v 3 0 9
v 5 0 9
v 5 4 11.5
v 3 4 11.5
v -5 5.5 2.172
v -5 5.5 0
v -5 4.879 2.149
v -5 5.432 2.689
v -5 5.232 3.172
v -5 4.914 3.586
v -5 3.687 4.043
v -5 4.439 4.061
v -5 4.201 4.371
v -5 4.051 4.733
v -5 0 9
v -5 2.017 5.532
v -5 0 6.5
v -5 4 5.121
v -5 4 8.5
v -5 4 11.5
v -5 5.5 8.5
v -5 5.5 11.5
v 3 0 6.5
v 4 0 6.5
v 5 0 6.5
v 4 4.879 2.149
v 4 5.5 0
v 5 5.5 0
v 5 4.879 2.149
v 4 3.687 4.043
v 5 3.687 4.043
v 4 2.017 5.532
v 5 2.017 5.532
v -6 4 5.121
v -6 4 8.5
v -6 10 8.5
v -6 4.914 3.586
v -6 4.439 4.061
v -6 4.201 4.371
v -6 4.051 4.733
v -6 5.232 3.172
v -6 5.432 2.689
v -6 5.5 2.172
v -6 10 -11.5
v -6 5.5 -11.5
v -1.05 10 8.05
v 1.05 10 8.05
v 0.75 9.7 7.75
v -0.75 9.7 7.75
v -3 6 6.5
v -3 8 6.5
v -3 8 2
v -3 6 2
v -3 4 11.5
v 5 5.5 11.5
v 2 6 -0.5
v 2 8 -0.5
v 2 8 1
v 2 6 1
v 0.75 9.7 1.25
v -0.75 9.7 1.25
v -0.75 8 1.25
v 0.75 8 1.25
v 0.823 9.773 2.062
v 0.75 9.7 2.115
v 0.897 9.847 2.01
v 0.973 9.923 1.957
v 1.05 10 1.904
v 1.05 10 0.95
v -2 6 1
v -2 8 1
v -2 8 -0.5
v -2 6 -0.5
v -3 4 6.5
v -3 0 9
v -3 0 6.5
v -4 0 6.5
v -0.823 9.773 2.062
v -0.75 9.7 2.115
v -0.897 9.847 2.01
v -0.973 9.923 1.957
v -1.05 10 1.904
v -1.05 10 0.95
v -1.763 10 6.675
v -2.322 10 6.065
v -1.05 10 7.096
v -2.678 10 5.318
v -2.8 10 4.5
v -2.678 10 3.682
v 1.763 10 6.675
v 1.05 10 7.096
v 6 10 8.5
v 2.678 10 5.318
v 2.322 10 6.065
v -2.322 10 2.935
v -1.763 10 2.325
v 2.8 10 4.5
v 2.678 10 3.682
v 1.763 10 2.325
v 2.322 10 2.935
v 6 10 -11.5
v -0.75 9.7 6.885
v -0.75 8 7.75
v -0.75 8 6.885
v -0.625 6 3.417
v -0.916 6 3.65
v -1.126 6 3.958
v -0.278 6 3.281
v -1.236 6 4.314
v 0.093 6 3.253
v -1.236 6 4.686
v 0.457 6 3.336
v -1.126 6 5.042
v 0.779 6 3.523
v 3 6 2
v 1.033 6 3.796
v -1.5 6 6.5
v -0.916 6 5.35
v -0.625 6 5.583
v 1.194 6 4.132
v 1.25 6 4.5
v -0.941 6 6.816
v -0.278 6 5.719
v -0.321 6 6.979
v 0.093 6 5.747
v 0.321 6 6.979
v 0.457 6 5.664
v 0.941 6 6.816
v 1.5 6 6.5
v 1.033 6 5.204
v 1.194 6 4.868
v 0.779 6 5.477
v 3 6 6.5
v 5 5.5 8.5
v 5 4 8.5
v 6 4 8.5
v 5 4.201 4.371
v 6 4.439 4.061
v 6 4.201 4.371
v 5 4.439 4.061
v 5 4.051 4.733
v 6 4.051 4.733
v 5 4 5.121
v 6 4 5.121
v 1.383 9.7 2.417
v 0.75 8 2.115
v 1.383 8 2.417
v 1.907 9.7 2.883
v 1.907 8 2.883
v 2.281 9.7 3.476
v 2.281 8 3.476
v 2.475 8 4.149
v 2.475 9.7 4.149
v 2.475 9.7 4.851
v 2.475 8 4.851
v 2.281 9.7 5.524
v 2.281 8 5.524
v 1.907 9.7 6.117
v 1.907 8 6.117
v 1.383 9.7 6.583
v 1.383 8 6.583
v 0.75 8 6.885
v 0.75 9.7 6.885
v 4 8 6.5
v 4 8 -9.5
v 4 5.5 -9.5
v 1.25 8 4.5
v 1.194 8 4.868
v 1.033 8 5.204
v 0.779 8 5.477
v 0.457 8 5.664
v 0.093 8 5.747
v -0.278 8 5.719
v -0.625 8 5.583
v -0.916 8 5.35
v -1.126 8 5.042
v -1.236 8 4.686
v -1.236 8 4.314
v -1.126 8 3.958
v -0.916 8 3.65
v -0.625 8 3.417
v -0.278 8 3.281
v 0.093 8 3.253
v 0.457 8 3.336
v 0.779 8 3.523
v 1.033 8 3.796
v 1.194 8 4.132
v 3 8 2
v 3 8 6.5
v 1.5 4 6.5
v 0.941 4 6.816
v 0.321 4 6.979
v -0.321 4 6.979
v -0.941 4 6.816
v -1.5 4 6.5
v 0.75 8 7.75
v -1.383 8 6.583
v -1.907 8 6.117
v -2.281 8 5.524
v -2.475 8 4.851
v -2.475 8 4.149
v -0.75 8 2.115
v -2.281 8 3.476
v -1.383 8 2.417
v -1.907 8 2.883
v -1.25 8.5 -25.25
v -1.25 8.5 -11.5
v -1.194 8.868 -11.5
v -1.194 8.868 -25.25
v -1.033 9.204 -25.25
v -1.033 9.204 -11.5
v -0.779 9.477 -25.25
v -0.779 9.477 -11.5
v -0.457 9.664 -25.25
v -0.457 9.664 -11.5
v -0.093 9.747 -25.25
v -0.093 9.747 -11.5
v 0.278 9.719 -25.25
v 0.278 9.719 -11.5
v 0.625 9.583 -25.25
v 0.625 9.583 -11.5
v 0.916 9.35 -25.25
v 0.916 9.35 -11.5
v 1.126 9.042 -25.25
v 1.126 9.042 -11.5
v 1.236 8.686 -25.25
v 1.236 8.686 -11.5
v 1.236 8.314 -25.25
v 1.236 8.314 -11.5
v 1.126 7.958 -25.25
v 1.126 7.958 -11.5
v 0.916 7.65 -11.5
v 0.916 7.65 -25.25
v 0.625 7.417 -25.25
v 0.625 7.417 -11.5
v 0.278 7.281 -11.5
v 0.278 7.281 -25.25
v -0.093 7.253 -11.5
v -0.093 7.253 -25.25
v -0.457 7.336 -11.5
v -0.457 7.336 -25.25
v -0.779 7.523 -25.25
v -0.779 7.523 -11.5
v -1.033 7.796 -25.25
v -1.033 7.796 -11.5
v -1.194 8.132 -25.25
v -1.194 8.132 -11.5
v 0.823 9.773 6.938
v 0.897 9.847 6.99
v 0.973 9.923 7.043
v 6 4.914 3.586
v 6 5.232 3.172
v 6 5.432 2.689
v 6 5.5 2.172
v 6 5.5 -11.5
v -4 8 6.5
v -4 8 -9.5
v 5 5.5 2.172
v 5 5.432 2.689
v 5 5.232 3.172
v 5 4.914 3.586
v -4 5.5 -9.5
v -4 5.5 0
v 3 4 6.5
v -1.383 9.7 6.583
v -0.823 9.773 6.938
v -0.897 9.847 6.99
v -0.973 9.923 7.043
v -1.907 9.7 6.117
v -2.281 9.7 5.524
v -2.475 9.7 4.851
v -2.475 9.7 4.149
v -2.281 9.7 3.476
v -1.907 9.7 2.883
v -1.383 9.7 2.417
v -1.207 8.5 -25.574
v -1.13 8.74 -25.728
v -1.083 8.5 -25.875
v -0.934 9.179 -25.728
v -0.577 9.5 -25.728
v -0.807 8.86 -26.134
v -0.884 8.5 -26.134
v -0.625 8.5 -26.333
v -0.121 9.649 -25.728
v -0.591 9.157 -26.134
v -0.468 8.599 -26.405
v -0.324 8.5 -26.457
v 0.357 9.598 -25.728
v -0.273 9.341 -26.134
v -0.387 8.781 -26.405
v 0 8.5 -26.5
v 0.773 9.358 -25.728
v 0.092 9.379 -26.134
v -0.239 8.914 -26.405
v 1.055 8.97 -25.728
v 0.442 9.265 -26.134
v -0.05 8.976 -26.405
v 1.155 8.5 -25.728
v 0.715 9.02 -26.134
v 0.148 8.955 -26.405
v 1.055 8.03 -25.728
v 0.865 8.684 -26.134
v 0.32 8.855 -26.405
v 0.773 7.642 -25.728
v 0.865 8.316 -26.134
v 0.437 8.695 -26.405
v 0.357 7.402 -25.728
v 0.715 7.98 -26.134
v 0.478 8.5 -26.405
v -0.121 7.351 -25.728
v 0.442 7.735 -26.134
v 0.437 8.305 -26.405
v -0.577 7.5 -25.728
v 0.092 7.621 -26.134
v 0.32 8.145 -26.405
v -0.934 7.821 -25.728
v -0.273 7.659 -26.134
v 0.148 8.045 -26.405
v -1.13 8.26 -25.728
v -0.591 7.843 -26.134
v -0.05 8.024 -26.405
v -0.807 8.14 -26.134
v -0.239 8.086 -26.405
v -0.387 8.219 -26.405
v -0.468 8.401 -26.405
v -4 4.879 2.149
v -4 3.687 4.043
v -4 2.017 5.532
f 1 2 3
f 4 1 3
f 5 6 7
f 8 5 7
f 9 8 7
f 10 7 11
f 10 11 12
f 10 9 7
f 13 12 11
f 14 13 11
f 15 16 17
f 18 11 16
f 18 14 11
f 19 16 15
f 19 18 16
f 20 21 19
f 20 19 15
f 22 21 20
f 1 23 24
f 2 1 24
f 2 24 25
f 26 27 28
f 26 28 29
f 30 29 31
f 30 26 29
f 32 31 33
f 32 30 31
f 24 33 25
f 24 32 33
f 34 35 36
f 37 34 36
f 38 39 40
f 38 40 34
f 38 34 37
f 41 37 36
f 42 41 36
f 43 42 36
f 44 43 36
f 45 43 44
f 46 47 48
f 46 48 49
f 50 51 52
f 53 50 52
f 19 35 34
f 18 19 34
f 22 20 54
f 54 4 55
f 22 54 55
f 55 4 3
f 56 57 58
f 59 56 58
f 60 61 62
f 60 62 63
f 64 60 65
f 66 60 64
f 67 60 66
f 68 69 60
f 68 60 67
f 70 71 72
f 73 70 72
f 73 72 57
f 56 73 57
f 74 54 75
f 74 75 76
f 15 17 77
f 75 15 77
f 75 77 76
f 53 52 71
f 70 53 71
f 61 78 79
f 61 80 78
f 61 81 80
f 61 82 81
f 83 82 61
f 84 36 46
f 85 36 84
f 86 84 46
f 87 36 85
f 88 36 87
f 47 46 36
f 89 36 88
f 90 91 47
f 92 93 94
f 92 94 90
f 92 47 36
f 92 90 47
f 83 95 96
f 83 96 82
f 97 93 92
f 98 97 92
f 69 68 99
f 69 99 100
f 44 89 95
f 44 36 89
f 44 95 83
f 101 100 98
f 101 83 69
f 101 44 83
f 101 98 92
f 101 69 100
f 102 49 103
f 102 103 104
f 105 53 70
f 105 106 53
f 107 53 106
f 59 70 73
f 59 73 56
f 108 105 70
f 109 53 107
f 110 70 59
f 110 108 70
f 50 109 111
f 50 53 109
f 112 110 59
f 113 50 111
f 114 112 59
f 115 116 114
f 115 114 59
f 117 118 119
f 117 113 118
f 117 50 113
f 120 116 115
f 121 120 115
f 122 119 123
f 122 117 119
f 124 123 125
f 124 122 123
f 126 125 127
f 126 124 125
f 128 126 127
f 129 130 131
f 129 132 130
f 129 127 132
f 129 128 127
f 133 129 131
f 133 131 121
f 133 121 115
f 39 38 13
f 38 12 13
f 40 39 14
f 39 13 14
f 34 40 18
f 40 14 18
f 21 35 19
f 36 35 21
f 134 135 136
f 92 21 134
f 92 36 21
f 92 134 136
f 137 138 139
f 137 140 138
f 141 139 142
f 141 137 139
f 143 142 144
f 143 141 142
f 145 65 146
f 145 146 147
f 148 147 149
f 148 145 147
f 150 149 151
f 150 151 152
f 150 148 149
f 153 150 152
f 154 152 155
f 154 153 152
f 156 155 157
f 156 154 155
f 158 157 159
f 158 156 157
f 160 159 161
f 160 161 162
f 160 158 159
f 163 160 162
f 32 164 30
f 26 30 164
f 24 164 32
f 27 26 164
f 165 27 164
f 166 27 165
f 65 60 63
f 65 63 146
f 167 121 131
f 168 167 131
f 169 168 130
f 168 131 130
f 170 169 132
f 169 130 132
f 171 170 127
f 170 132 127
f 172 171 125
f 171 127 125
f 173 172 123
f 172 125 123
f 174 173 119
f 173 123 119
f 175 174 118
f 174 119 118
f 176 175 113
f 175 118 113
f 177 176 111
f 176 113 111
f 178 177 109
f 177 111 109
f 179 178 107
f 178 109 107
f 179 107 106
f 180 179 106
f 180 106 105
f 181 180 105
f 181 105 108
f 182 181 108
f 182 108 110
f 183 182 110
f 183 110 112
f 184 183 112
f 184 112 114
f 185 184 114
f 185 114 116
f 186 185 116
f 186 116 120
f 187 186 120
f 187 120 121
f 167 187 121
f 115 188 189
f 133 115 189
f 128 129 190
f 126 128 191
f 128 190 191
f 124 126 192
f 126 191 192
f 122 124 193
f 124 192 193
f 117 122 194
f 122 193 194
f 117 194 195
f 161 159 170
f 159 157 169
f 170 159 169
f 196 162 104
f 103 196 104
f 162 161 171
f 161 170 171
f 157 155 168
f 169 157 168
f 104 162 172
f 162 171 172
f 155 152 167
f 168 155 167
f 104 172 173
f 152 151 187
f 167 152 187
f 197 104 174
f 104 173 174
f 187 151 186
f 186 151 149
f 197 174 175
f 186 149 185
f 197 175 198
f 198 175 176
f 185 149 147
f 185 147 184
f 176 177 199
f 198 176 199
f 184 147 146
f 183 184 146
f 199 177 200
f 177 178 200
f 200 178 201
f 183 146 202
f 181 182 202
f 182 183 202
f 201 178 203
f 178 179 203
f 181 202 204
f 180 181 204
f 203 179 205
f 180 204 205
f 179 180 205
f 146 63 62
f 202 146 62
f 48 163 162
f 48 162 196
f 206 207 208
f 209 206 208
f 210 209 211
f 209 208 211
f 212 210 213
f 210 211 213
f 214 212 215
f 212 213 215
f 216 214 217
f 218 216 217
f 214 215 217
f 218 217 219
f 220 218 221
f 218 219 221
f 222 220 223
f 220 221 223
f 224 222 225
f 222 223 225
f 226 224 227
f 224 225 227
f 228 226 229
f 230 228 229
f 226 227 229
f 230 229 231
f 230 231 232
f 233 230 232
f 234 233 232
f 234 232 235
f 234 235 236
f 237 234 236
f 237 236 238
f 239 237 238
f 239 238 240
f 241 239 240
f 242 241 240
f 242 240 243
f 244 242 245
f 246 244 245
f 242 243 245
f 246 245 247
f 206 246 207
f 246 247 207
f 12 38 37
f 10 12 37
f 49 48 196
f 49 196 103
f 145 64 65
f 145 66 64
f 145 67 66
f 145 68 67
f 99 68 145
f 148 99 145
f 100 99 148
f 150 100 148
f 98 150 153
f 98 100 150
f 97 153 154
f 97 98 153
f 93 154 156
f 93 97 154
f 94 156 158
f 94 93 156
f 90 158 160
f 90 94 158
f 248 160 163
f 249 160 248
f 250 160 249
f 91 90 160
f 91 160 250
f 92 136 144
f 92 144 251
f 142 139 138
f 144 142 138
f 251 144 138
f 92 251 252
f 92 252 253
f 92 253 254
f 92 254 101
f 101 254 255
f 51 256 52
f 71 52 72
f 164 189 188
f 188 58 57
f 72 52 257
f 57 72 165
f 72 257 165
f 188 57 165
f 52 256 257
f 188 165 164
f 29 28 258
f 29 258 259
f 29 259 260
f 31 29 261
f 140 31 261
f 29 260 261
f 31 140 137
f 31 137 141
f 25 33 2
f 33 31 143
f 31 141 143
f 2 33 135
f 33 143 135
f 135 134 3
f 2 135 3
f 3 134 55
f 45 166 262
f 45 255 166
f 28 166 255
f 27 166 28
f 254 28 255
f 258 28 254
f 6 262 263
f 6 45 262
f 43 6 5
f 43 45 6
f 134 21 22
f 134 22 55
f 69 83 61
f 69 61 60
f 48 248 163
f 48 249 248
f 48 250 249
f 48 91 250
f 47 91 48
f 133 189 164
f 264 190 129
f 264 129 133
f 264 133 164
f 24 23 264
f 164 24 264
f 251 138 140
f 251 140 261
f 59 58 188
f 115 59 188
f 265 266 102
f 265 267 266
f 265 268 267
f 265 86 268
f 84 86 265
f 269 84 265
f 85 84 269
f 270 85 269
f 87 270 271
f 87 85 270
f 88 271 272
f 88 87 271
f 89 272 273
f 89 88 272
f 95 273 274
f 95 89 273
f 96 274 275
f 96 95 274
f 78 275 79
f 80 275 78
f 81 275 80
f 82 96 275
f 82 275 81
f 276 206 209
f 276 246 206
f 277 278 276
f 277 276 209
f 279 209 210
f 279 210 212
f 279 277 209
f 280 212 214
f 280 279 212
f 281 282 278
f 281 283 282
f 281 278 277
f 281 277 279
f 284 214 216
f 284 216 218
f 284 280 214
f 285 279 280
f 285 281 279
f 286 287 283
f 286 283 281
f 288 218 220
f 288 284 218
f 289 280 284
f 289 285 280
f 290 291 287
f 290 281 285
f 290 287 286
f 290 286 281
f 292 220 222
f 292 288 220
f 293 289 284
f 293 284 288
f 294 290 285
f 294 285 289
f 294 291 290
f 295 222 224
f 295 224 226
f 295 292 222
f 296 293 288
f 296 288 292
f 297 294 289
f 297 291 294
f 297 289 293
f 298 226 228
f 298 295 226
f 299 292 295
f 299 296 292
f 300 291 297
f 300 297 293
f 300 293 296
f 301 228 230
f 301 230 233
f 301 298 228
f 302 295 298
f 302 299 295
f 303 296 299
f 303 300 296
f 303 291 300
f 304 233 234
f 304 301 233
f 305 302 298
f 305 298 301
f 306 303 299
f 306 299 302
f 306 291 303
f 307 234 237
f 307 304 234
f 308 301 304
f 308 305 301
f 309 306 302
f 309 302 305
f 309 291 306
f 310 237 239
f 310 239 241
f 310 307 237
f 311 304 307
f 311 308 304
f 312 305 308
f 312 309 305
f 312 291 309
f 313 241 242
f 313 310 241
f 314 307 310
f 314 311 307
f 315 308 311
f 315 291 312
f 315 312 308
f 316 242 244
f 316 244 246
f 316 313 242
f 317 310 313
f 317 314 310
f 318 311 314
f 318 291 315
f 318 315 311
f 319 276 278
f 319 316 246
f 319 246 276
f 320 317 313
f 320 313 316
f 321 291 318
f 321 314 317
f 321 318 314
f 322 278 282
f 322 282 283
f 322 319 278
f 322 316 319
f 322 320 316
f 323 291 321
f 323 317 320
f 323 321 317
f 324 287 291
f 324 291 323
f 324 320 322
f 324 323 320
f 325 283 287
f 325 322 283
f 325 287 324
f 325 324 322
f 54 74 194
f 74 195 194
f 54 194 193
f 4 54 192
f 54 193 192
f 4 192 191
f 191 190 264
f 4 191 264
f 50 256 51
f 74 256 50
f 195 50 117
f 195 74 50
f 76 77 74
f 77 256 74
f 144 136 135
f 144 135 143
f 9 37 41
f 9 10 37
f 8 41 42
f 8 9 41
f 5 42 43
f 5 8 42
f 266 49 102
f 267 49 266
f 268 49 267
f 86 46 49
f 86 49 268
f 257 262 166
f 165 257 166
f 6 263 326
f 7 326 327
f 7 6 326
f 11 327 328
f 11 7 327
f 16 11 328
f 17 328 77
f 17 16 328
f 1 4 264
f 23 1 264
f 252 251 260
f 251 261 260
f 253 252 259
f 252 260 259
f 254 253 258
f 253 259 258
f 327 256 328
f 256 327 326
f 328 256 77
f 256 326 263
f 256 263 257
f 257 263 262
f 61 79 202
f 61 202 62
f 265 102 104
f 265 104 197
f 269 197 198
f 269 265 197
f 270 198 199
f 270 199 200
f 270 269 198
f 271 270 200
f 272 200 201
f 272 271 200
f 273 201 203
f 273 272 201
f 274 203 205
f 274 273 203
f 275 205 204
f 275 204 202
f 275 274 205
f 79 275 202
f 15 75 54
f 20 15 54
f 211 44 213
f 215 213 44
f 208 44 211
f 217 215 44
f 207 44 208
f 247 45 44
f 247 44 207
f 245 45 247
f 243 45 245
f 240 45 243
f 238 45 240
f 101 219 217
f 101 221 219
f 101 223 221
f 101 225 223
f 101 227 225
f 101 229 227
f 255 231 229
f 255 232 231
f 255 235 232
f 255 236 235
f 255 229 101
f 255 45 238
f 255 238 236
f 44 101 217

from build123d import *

# Parameters (mm, degrees)
SKETCH_1_W             = 12
SKETCH_1_H             = 23
EXTRUDE_1_DEPTH        = 10
SKETCH_3_W             = 12
SKETCH_3_H             = 3
CUT_EXTRUDE_1_DEPTH    = 4.5
SKETCH_4_W             = 1
SKETCH_4_H             = 3
CUT_EXTRUDE_2_DEPTH    = 11
CUT_EXTRUDE_3_DEPTH    = 6
CUT_EXTRUDE_4_DEPTH    = 1
FILLET_1_R             = 1.5
FILLET_2_R             = 2
FILLET_1_OF_MIRROR_1_R = 1.5
FILLET_2_OF_MIRROR_1_R = 2
SKETCH_7_W             = 6
SKETCH_7_H             = 11.5
CUT_EXTRUDE_5_DEPTH    = 4
SKETCH_8_W             = 8
SKETCH_8_H             = 16
CUT_EXTRUDE_6_DEPTH    = 8
SKETCH_9_R             = 2.5
CUT_EXTRUDE_7_DEPTH    = 4
EXTRUDE_2_DEPTH        = 2
SKETCH_11_R            = 1.25
CUT_EXTRUDE_8_DEPTH    = 5
CUT_EXTRUDE_9_DEPTH    = 2
CHAMFER_1_SIZE         = 0.3
SKETCH_13_R            = 1.25
EXTRUDE_3_DEPTH        = 15
FILLET_3_R             = 1.25


with BuildPart() as part:
    # 草图1 → 凸台-拉伸1 (new body)
    with BuildSketch(Plane(origin=(0, 0, 0), x_dir=(1, 0, 0), z_dir=(0, 1, 0))):
        Rectangle(SKETCH_1_W, SKETCH_1_H)
    extrude(amount=EXTRUDE_1_DEPTH)

    # 草图3 → 切除-拉伸1 (cut)
    with BuildSketch(Plane(origin=(0, 10, 0), x_dir=(1, 0, 0), z_dir=(0, 1, 0))):
        with Locations((0, -10)):
            Rectangle(SKETCH_3_W, SKETCH_3_H)
    extrude(amount=-CUT_EXTRUDE_1_DEPTH, mode=Mode.SUBTRACT)

    # 草图4 → 切除-拉伸2 (cut, through all)
    with BuildSketch(Plane(origin=(0, 0, 0), x_dir=(1, 0, 0), z_dir=(0, 1, 0))):
        with Locations((5.5, -10)):
            Rectangle(SKETCH_4_W, SKETCH_4_H)
        with Locations((-5.5, -10)):
            Rectangle(SKETCH_4_W, SKETCH_4_H)
    extrude(amount=CUT_EXTRUDE_2_DEPTH, mode=Mode.SUBTRACT)

    # 草图5 → 切除-拉伸3 (cut, symmetric)
    with BuildSketch(Plane(origin=(0, 0, 0), x_dir=(0, 0, -1), z_dir=(1, 0, 0))):
        with BuildLine():
            Line((11.5, 5.5), (0, 5.5))
            ThreePointArc((0, 5.5), (-4.042500986, 3.686592074), (-6.5, 0))
            Line((-6.5, 0), (11.5, 0))
            Line((11.5, 0), (11.5, 5.5))
        make_face()
        Polygon((-9, 0), (-11.5, 4), (-11.5, 0), align=None)
    extrude(amount=CUT_EXTRUDE_3_DEPTH, both=True, mode=Mode.SUBTRACT)

    # 草图6 → 切除-拉伸4 (cut)
    with BuildSketch(Plane(origin=(6, 0, 0), x_dir=(0, 0, -1), z_dir=(1, 0, 0))):
        with BuildLine():
            Line((-8.5, 4), (-4.5, 4))
            Line((-4.5, 4), (-3, 5.5))
            Line((-3, 5.5), (0, 5.5))
            ThreePointArc((0, 5.5), (-4.042500986, 3.686592074), (-6.5, 0))
            Line((-6.5, 0), (-8.5, 0))
            Line((-8.5, 0), (-8.5, 4))
        make_face()
    cut_extrude_4 = extrude(amount=-CUT_EXTRUDE_4_DEPTH, mode=Mode.SUBTRACT)

    # 圆角1
    fillet_1_edges = [part.edges().sort_by_distance(p)[0] for p in [
        (5.5, 4, 4.5),
    ]]
    fillet(fillet_1_edges, radius=FILLET_1_R)

    # 圆角2
    fillet_2_edges = [part.edges().sort_by_distance(p)[0] for p in [
        (5.5, 5.5, 3),
    ]]
    fillet(fillet_2_edges, radius=FILLET_2_R)

    # 镜向1: 切除-拉伸4 across plane
    add(cut_extrude_4.mirror(Plane(origin=(0, 0, 0), x_dir=(0, 0, 1), z_dir=(1, 0, 0))), mode=Mode.SUBTRACT)

    # 圆角1 of 镜向1
    fillet_1_of_mirror_1_edges = [part.edges().sort_by_distance(p)[0] for p in [
        (-5.5, 4, 4.5),
    ]]
    fillet(fillet_1_of_mirror_1_edges, radius=FILLET_1_OF_MIRROR_1_R)

    # 圆角2 of 镜向1
    fillet_2_of_mirror_1_edges = [part.edges().sort_by_distance(p)[0] for p in [
        (-5.5, 5.5, 3),
    ]]
    fillet(fillet_2_of_mirror_1_edges, radius=FILLET_2_OF_MIRROR_1_R)

    # 草图7 → 切除-拉伸5 (cut)
    with BuildSketch(Plane(origin=(0, 0, 0), x_dir=(1, 0, 0), z_dir=(0, 1, 0))):
        with Locations((0, -5.75)):
            Rectangle(SKETCH_7_W, SKETCH_7_H)
    extrude(amount=CUT_EXTRUDE_5_DEPTH, mode=Mode.SUBTRACT)

    # 草图8 → 切除-拉伸6 (cut)
    with BuildSketch(Plane(origin=(0, 0, 0), x_dir=(1, 0, 0), z_dir=(0, 1, 0))):
        with Locations((0, 1.5)):
            Rectangle(SKETCH_8_W, SKETCH_8_H)
    extrude(amount=CUT_EXTRUDE_6_DEPTH, mode=Mode.SUBTRACT)

    # 草图9 → 切除-拉伸7 (cut)
    with BuildSketch(Plane.XZ.offset(-4)):
        with Locations((0, 4.5)):
            Circle(SKETCH_9_R)
    extrude(amount=-CUT_EXTRUDE_7_DEPTH, mode=Mode.SUBTRACT)

    # 草图10 → 凸台-拉伸2 (add)
    with BuildSketch(Plane.XZ.offset(-8)):
        with BuildLine():
            Line((2, 1), (3, 2))
            Line((3, 2), (3, 6.5))
            Line((3, 6.5), (1.5, 6.5))
            ThreePointArc((1.5, 6.5), (0, 7), (-1.5, 6.5))
            Line((-1.5, 6.5), (-3, 6.5))
            Line((-3, 6.5), (-3, 2))
            Line((-3, 2), (-2, 1))
            Line((-2, 1), (-2, -0.5))
            Line((-2, -0.5), (2, -0.5))
            Line((2, -0.5), (2, 1))
        make_face()
    extrude(amount=EXTRUDE_2_DEPTH)

    # 草图11 → 切除-拉伸8 (cut, through all)
    with BuildSketch(Plane.XZ.offset(-6)):
        with Locations((0, 4.5)):
            Circle(SKETCH_11_R)
    extrude(amount=-CUT_EXTRUDE_8_DEPTH, mode=Mode.SUBTRACT)

    # 草图12 → 切除-拉伸9 (cut)
    with BuildSketch(Plane(origin=(0, 10, 0), x_dir=(1, 0, 0), z_dir=(0, 1, 0))):
        with BuildLine():
            Line((-0.75, -1.25), (0.75, -1.25))
            Line((0.75, -1.25), (0.75, -2.115151996))
            ThreePointArc((0.75, -2.115151996), (2.5, -4.5), (0.75, -6.884848004))
            Line((0.75, -6.884848004), (0.75, -7.75))
            Line((0.75, -7.75), (-0.75, -7.75))
            Line((-0.75, -7.75), (-0.75, -6.884848004))
            ThreePointArc((-0.75, -6.884848004), (-2.5, -4.5), (-0.75, -2.115151996))
            Line((-0.75, -2.115151996), (-0.75, -1.25))
        make_face()
    extrude(amount=-CUT_EXTRUDE_9_DEPTH, mode=Mode.SUBTRACT)

    # 倒角1
    chamfer_1_edges = [part.edges().sort_by_distance(p)[0] for p in [
        (2.5, 10, 4.5),
        (0.75, 10, 1.682575998),
        (0, 10, 1.25),
        (-0.75, 10, 1.682575998),
        (-2.5, 10, 4.5),
        (-0.75, 10, 7.317424002),
        (0, 10, 7.75),
        (0.75, 10, 7.317424002),
    ]]
    chamfer(chamfer_1_edges, length=CHAMFER_1_SIZE)

    # 草图13 → 凸台-拉伸3 (add)
    with BuildSketch(Plane(origin=(0, 0, -11.5), x_dir=(-1, 0, 0), z_dir=(0, 0, -1))):
        with Locations((0, 8.5)):
            Circle(SKETCH_13_R)
    extrude(amount=EXTRUDE_3_DEPTH)

    # 圆角3
    fillet_3_edges = [part.edges().sort_by_distance(p)[0] for p in [
        (1.25, 8.5, -26.5),
    ]]
    fillet(fillet_3_edges, radius=FILLET_3_R)


solid = part.part
